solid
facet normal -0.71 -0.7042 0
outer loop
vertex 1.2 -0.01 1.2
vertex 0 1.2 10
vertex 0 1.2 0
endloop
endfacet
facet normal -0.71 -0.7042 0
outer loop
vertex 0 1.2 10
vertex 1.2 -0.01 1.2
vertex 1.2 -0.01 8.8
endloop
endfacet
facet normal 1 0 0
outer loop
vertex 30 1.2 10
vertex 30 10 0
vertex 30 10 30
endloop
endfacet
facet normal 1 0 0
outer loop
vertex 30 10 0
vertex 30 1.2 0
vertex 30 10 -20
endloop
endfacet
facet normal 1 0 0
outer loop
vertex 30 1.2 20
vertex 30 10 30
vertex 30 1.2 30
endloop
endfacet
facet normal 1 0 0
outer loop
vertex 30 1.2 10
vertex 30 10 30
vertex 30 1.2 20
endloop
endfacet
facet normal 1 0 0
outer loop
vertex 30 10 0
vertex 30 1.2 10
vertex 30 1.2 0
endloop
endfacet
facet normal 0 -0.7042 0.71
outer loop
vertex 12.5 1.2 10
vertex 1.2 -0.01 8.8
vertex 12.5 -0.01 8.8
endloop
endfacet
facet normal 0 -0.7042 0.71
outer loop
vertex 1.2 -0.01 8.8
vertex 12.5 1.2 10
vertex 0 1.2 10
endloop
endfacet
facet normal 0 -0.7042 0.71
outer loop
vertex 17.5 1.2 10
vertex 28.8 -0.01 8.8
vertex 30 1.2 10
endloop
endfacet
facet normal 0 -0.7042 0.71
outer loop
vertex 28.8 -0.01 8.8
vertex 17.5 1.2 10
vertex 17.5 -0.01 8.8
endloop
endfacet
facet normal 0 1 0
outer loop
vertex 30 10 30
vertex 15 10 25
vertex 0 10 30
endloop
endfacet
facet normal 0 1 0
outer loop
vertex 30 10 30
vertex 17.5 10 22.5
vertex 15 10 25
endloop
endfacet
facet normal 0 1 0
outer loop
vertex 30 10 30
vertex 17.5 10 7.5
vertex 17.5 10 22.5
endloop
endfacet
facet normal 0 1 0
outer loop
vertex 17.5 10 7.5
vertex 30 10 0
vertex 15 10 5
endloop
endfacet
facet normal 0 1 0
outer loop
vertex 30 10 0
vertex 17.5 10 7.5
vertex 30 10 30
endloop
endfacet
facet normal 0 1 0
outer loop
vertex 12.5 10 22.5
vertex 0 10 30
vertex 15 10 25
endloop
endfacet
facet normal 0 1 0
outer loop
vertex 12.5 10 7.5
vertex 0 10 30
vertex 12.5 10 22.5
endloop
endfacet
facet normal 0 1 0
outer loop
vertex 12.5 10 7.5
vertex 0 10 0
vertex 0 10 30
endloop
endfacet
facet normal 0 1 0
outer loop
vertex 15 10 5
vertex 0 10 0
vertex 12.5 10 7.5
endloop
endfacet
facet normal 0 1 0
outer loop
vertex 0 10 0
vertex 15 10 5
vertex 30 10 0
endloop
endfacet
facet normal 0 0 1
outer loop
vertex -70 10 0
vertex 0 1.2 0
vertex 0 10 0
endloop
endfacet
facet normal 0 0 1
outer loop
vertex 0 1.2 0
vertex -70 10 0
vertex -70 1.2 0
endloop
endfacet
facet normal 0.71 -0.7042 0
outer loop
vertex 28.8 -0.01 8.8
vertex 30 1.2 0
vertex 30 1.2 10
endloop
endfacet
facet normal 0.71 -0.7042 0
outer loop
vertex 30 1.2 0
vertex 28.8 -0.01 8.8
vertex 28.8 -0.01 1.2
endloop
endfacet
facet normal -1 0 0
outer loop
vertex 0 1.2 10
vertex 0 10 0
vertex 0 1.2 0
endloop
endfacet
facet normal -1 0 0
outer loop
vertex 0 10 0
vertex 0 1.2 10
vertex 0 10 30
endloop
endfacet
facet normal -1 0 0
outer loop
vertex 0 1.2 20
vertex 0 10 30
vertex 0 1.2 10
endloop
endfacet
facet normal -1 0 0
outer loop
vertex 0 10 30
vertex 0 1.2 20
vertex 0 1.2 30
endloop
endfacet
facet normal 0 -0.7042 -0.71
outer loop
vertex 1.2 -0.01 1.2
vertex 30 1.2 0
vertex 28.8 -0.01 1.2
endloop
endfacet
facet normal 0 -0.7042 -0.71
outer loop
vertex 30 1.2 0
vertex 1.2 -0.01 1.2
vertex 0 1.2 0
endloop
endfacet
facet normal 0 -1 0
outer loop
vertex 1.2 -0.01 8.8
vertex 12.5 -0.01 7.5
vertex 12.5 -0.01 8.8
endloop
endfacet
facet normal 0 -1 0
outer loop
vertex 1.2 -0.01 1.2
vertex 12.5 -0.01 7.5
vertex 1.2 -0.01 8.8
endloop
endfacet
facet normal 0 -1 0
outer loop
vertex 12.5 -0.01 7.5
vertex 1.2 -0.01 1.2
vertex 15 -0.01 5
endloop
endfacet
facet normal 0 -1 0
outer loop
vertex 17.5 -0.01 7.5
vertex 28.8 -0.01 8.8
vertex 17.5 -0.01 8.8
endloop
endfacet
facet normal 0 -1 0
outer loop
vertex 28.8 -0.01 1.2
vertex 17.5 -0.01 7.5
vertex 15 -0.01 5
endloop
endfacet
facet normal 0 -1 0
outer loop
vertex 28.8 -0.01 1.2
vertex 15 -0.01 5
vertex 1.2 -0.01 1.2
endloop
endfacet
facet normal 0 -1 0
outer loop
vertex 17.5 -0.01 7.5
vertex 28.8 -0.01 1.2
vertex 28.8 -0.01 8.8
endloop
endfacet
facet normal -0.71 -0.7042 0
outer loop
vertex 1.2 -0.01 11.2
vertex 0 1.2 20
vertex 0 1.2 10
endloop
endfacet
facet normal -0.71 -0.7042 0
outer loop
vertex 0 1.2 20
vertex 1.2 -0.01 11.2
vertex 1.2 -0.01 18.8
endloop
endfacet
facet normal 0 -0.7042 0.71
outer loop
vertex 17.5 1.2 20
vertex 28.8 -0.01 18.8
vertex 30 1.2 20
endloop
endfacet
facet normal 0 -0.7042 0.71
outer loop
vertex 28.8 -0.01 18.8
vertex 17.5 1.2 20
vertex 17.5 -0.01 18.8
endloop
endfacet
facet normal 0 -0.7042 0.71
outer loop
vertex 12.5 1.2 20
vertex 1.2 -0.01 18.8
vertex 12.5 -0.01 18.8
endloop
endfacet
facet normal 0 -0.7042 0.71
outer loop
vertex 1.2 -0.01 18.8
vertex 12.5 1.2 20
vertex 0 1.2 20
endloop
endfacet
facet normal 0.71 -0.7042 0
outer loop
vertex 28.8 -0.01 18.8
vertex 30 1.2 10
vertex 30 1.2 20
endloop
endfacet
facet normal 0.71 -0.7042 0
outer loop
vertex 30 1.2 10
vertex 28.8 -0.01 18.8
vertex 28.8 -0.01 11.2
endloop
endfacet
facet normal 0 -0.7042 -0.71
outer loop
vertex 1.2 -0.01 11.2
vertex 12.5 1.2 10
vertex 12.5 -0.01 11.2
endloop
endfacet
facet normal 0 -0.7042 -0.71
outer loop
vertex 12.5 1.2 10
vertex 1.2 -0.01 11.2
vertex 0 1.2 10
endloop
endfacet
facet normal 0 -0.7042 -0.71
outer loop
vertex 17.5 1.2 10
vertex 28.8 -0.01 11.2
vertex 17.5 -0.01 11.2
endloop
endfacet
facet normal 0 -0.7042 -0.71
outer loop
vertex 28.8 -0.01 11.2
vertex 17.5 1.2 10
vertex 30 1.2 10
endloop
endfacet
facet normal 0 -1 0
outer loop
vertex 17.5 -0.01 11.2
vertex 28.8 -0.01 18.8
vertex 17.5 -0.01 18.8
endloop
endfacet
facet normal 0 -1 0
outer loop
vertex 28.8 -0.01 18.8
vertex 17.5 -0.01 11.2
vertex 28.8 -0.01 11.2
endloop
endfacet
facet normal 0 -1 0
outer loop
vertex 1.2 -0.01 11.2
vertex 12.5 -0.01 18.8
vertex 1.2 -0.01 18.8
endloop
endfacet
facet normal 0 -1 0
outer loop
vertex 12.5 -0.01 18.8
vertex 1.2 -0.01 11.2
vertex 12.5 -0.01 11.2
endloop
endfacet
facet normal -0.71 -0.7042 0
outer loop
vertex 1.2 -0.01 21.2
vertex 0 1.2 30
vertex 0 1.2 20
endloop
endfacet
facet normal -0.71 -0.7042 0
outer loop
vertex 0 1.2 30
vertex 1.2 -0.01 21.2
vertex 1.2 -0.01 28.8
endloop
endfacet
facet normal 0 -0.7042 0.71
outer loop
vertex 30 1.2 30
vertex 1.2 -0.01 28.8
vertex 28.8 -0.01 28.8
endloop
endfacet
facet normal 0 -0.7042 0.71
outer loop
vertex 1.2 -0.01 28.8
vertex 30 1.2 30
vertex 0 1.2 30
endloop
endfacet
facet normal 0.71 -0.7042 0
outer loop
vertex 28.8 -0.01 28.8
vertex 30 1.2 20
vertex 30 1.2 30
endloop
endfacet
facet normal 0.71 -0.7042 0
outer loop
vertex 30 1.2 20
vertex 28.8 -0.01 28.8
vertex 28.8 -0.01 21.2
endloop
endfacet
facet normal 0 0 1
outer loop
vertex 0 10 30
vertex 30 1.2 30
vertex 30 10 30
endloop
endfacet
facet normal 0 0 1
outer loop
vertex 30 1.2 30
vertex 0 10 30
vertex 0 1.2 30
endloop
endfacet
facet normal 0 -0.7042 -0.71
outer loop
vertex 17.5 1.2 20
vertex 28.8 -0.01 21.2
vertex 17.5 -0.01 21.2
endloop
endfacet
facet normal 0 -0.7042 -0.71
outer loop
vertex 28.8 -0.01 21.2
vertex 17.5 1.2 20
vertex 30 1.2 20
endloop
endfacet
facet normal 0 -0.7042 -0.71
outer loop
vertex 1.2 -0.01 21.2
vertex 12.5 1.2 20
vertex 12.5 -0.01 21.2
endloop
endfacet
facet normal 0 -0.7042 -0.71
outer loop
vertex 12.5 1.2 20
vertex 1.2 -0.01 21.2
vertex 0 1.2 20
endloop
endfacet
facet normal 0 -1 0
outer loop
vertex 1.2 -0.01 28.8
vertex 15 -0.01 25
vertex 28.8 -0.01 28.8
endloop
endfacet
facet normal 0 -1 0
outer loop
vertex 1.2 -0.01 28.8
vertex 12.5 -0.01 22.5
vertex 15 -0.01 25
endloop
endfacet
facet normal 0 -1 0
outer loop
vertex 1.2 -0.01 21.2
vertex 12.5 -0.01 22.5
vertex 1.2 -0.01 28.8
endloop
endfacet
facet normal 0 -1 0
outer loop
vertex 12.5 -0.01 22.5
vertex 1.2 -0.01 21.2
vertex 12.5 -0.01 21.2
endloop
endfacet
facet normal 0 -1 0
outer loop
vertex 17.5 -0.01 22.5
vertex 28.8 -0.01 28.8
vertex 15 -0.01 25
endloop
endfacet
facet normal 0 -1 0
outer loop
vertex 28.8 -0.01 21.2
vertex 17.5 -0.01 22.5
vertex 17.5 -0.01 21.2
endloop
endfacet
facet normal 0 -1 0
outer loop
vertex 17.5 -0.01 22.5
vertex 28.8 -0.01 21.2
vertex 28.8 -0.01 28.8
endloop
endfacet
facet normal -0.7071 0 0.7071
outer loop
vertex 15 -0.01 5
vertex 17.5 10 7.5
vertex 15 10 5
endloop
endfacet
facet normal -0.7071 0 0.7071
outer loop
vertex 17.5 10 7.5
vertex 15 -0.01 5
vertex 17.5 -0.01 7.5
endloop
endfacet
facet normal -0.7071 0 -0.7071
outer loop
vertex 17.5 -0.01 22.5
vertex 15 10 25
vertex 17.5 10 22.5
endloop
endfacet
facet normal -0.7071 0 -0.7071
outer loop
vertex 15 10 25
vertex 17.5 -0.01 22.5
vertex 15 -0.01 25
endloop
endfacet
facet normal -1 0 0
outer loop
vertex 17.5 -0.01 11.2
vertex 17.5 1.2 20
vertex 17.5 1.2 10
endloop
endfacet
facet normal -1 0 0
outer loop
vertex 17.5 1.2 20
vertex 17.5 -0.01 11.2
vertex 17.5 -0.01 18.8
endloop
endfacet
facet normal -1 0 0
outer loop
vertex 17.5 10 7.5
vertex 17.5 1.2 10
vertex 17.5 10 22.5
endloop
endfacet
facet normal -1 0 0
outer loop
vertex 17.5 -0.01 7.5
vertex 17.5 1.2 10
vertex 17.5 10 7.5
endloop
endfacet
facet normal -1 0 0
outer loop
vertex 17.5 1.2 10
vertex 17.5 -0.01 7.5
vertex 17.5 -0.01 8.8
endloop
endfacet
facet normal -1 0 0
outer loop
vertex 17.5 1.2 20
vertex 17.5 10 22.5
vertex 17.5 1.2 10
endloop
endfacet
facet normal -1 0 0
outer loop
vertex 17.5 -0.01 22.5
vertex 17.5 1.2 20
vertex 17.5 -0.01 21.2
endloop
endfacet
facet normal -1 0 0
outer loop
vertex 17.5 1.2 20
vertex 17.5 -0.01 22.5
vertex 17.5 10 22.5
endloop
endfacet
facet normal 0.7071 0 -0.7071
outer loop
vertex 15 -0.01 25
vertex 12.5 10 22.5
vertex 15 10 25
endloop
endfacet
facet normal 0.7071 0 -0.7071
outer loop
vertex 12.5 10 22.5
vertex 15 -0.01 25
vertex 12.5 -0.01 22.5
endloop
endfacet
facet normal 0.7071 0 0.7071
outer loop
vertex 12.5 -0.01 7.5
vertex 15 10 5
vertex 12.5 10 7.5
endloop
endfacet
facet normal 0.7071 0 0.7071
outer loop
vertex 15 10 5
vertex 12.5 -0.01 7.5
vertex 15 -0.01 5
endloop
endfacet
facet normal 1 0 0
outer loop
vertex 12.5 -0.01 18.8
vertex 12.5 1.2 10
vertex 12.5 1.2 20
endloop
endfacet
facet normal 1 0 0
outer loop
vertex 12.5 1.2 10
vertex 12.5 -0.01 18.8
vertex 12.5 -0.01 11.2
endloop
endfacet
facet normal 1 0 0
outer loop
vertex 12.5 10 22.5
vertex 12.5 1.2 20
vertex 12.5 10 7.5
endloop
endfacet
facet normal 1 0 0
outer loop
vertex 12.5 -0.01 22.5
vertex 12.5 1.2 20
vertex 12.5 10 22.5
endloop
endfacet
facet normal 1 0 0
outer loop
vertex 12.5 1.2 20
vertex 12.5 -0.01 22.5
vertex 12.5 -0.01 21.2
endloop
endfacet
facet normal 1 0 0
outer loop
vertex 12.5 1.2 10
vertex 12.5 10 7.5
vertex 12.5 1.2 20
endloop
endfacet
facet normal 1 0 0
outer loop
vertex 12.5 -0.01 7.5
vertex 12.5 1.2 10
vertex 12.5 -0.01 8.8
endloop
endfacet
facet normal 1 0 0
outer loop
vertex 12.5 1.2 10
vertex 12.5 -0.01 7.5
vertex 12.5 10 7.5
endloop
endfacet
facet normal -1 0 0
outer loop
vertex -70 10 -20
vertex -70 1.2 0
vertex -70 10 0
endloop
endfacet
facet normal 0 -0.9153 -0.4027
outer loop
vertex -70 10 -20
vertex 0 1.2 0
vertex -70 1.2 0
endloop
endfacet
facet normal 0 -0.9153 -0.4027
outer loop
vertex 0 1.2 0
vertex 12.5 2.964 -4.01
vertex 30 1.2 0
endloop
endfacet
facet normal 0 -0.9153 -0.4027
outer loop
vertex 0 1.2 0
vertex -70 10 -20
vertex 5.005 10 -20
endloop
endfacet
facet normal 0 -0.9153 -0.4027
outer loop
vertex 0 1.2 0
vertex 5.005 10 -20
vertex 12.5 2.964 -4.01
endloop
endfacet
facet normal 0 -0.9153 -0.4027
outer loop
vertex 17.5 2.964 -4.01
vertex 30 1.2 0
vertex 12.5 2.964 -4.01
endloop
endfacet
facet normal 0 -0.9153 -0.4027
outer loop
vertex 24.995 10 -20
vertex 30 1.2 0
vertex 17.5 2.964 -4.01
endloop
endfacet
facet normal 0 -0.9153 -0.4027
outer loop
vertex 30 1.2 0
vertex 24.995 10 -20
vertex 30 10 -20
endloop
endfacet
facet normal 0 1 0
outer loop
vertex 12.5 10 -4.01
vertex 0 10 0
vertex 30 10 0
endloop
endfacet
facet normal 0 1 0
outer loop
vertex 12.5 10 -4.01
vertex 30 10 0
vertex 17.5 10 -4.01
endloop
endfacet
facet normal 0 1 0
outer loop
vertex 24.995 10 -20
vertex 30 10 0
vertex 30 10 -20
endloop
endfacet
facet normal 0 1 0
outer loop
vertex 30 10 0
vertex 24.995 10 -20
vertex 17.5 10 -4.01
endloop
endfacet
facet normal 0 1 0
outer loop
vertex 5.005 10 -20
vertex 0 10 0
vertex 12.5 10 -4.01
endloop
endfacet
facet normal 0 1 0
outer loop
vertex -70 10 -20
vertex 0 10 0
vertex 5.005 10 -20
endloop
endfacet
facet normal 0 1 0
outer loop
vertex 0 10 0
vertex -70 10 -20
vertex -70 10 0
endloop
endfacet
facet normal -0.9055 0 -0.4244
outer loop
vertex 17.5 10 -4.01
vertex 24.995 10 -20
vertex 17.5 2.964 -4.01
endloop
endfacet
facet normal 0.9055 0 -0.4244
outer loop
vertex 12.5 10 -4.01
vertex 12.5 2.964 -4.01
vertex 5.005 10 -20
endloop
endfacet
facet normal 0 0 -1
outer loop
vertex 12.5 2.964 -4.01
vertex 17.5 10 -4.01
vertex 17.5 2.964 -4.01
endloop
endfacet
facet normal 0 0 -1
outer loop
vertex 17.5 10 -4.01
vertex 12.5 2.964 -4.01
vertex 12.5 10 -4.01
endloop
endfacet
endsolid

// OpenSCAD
// file: brick.scad
eps = 0.01;

module brick(width, height, depth, surface, bumpiness = 0.5, camph = 1.2) {
    translate([camph, camph, depth])
    scale([(width - 2*camph)/22, (height - 2*camph)/12, bumpiness])
    surface(surface);

    polyhedron(
        points = [
            [ 0,     0,     0 ],
            [ width, 0,     0 ],
            [ width, height, 0 ],
            [ 0,     height, 0 ],

            [ 0,     0,      depth - camph ],
            [ width, 0,      depth - camph ],
            [ width, height, depth - camph ],
            [ 0,     height, depth - camph ],

            [ camph,         camph,          depth + eps ],
            [ width - camph, camph,          depth + eps ],
            [ width - camph, height - camph, depth + eps ],
            [ camph,         height - camph, depth + eps ]
        ],
        faces = [
            [ 0, 1, 2, 3 ],

            [ 0, 4, 5, 1 ],
            [ 1, 5, 6, 2 ],

            [ 2, 6, 7, 3 ],
            [ 3, 7, 4, 0 ],

            [ 4, 8, 9, 5 ],
            [ 5, 9, 10, 6 ],
            [ 6, 10, 11, 7 ],
            [ 7, 11, 8, 4 ],

            [ 8, 11, 10, 9 ]
        ],
        convexity = 10
    );
}

brick(30, 10, 5, "surfaces/1.txt");
// main file
use <brick.scad>;

eps = 0.01;

brick_width = 30;
brick_height = 10;
brick_depth = 10;

loophole_height = 2*brick_height;
loophole_width = 0.5*brick_height;

camph = 1.2;

module rotated_brick(width, height, depth, surface, bumpiness = 0.5, camph = camph) {
     translate([ 0, depth, 0])
     rotate([90, 0, 0])
     brick(width, height, depth, surface, bumpiness, camph );
}

module corbel(width, depth, height) {
    difference() {
        translate([width, depth, 0])
        rotate([90, 0, 0])
        rotate([0, -90, 0])
        linear_extrude(h = brick_width) {
            polygon([
                [0, 0],
                [0, -height],
                [depth, 0]
            ]);
        }
        
        insetx = width/6;
        insety = height*0.8;

        translate([brick_width/2, depth, -height-eps])
        rotate([90, 0, 0])
        linear_extrude(h = depth + 2*eps ) {
            polygon([
                [ -brick_width/2 + insetx, 0],
                [  brick_width/2 - insetx, 0],
                [  insetx/2, insety ],
                [ -insetx/2, insety ]
            ]);
        }
    }
}

module merlon() {
    difference() {
        union() {
            rotated_brick(brick_width, brick_height, brick_depth, "surfaces/1.txt");
            
            translate([ 0, 0, brick_height])
            rotated_brick(brick_width, brick_height, brick_depth, "surfaces/2.txt");

            translate([ 0, 0, 2*brick_height])
            rotated_brick(brick_width, brick_height, brick_depth, "surfaces/3.txt");
        }
        
        translate([ brick_width/2, brick_depth + eps, 3*brick_height/2])
        rotate([90, 0, 0])
        linear_extrude(h=2*brick_depth) {
            polygon([
                [ 0,                -loophole_height/2],
                [ loophole_width/2, -loophole_height/2 + loophole_width/2 ],
                [ loophole_width/2,  loophole_height/2 - loophole_width/2 ],
                [ 0,                 loophole_height/2],
                [-loophole_width/2,  loophole_height/2 - loophole_width/2 ],
                [-loophole_width/2, -loophole_height/2 + loophole_width/2 ]                
            ]);
        }
    }
    
    translate([0, camph, 0])
    corbel(brick_width, brick_depth - camph, brick_depth*2);
}


merlon();
// corbel(brick_width, brick_depth, brick_depth*2);
